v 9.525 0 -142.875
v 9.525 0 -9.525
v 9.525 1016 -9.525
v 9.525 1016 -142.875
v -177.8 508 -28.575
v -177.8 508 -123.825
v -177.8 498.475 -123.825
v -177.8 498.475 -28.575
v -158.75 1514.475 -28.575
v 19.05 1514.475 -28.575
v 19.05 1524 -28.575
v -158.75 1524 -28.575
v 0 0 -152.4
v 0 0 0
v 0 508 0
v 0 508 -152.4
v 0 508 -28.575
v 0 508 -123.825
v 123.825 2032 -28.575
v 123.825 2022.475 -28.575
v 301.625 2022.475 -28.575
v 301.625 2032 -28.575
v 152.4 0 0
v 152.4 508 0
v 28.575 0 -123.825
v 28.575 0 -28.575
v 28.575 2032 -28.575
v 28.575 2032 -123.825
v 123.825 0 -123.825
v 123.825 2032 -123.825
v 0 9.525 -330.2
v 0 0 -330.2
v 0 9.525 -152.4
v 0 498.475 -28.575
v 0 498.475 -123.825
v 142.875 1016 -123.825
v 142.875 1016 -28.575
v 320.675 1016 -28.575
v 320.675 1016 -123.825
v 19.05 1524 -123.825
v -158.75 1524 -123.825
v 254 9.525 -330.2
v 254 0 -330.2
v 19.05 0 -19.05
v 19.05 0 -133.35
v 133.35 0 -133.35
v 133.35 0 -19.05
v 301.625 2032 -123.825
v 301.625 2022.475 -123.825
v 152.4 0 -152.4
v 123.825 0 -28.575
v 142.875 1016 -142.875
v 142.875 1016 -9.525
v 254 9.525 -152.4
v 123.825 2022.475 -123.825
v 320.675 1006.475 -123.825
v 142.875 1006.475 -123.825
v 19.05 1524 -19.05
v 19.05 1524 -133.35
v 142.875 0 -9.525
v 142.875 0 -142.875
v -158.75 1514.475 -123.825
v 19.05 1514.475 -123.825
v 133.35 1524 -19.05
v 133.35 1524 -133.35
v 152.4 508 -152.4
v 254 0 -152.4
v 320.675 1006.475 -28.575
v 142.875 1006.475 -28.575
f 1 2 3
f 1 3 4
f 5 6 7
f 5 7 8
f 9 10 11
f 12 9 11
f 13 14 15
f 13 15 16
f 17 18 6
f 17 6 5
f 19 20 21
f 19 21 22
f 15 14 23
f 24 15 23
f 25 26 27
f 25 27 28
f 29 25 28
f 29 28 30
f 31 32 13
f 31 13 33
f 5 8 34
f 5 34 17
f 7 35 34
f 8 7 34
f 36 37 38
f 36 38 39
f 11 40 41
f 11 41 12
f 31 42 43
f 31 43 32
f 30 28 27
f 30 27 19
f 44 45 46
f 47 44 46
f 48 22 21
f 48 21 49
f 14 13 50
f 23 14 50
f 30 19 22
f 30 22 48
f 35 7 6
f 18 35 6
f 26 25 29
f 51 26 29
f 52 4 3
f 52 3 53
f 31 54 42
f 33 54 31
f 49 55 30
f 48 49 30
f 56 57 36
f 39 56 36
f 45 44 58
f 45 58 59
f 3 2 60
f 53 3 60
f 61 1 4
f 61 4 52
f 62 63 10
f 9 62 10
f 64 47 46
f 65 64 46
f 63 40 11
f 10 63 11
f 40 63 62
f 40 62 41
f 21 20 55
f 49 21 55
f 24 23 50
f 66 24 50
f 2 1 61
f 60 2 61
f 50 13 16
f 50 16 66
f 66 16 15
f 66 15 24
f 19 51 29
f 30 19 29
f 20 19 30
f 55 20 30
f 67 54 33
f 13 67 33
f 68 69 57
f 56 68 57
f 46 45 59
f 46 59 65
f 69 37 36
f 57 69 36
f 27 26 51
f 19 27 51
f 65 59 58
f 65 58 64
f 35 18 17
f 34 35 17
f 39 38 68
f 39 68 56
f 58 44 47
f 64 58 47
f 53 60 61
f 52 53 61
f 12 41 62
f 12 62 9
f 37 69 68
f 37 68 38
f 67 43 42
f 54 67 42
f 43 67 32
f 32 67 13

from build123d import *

# Parameters (mm, degrees)
SKETCH1_W            = 95.25
SKETCH1_H            = 95.25
BOSS_EXTRUDE4_DEPTH  = 2032
SKETCH1_8_W          = 114.3
SKETCH1_8_H          = 114.3
BOSS_EXTRUDE5_DEPTH  = 1524
SKETCH1_9_W          = 133.35
SKETCH1_9_H          = 133.35
BOSS_EXTRUDE6_DEPTH  = 1016
SKETCH1_10_W         = 152.4
SKETCH1_10_H         = 152.4
BOSS_EXTRUDE7_DEPTH  = 508
SKETCH2_W            = 95.25
SKETCH2_H            = 9.525
BOSS_EXTRUDE8_DEPTH  = 177.8
SKETCH3_W            = 95.25
SKETCH3_H            = 9.525
BOSS_EXTRUDE9_DEPTH  = 177.8
SKETCH5_W            = 95.25
SKETCH5_H            = 9.525
BOSS_EXTRUDE10_DEPTH = 177.8
SKETCH6_W            = 95.25
SKETCH6_H            = 9.525
BOSS_EXTRUDE11_DEPTH = 177.8
SKETCH7_W            = 254
SKETCH7_H            = 9.525
BOSS_EXTRUDE12_DEPTH = 177.8


with BuildPart() as part:
    # Sketch1 → Boss-Extrude4 (new body)
    with BuildSketch(Plane(origin=(0, 0, 0), x_dir=(1, 0, 0), z_dir=(0, 1, 0))):
        with Locations((76.2, 76.2)):
            Rectangle(SKETCH1_W, SKETCH1_H)
    extrude(amount=BOSS_EXTRUDE4_DEPTH)


with BuildPart() as body_2:
    # Sketch1<8> → Boss-Extrude5 (new body)
    with BuildSketch(Plane(origin=(0, 0, 0), x_dir=(1, 0, 0), z_dir=(0, 1, 0))):
        with Locations((76.2, 76.2)):
            Rectangle(SKETCH1_8_W, SKETCH1_8_H)
    extrude(amount=BOSS_EXTRUDE5_DEPTH)


with BuildPart() as body_3:
    # Sketch1<9> → Boss-Extrude6 (new body)
    with BuildSketch(Plane(origin=(0, 0, 0), x_dir=(1, 0, 0), z_dir=(0, 1, 0))):
        with Locations((76.2, 76.2)):
            Rectangle(SKETCH1_9_W, SKETCH1_9_H)
    extrude(amount=BOSS_EXTRUDE6_DEPTH)


with BuildPart() as body_4:
    # Sketch1<10> → Boss-Extrude7 (new body)
    with BuildSketch(Plane(origin=(0, 0, 0), x_dir=(1, 0, 0), z_dir=(0, 1, 0))):
        with Locations((76.2, 76.2)):
            Rectangle(SKETCH1_10_W, SKETCH1_10_H)
    extrude(amount=BOSS_EXTRUDE7_DEPTH)


with BuildPart() as body_5:
    # Sketch2 → Boss-Extrude8 (new body)
    with BuildSketch(Plane(origin=(123.825, 0, 0), x_dir=(0, 0, -1), z_dir=(1, 0, 0))):
        with Locations((76.2, 2027.2375)):
            Rectangle(SKETCH2_W, SKETCH2_H)
    extrude(amount=BOSS_EXTRUDE8_DEPTH)


with BuildPart() as body_6:
    # Sketch3 → Boss-Extrude9 (new body)
    with BuildSketch(Plane.ZY.offset(-19.05)):
        with Locations((-76.2, 1519.2375)):
            Rectangle(SKETCH3_W, SKETCH3_H)
    extrude(amount=BOSS_EXTRUDE9_DEPTH)


with BuildPart() as body_7:
    # Sketch5 → Boss-Extrude10 (new body)
    with BuildSketch(Plane(origin=(142.875, 0, 0), x_dir=(0, 0, -1), z_dir=(1, 0, 0))):
        with Locations((76.2, 1011.2375)):
            Rectangle(SKETCH5_W, SKETCH5_H)
    extrude(amount=BOSS_EXTRUDE10_DEPTH)


with BuildPart() as body_8:
    # Sketch6 → Boss-Extrude11 (new body)
    with BuildSketch(Plane.ZY):
        with Locations((-76.2, 503.2375)):
            Rectangle(SKETCH6_W, SKETCH6_H)
    extrude(amount=BOSS_EXTRUDE11_DEPTH)


with BuildPart() as body_9:
    # Sketch7 → Boss-Extrude12 (new body)
    with BuildSketch(Plane(origin=(0, 0, -152.4), x_dir=(-1, 0, 0), z_dir=(0, 0, -1))):
        with Locations((-127, 4.7625)):
            Rectangle(SKETCH7_W, SKETCH7_H)
    extrude(amount=BOSS_EXTRUDE12_DEPTH)


solid = Compound([part.part, body_2.part, body_3.part, body_4.part, body_5.part, body_6.part, body_7.part, body_8.part, body_9.part])
